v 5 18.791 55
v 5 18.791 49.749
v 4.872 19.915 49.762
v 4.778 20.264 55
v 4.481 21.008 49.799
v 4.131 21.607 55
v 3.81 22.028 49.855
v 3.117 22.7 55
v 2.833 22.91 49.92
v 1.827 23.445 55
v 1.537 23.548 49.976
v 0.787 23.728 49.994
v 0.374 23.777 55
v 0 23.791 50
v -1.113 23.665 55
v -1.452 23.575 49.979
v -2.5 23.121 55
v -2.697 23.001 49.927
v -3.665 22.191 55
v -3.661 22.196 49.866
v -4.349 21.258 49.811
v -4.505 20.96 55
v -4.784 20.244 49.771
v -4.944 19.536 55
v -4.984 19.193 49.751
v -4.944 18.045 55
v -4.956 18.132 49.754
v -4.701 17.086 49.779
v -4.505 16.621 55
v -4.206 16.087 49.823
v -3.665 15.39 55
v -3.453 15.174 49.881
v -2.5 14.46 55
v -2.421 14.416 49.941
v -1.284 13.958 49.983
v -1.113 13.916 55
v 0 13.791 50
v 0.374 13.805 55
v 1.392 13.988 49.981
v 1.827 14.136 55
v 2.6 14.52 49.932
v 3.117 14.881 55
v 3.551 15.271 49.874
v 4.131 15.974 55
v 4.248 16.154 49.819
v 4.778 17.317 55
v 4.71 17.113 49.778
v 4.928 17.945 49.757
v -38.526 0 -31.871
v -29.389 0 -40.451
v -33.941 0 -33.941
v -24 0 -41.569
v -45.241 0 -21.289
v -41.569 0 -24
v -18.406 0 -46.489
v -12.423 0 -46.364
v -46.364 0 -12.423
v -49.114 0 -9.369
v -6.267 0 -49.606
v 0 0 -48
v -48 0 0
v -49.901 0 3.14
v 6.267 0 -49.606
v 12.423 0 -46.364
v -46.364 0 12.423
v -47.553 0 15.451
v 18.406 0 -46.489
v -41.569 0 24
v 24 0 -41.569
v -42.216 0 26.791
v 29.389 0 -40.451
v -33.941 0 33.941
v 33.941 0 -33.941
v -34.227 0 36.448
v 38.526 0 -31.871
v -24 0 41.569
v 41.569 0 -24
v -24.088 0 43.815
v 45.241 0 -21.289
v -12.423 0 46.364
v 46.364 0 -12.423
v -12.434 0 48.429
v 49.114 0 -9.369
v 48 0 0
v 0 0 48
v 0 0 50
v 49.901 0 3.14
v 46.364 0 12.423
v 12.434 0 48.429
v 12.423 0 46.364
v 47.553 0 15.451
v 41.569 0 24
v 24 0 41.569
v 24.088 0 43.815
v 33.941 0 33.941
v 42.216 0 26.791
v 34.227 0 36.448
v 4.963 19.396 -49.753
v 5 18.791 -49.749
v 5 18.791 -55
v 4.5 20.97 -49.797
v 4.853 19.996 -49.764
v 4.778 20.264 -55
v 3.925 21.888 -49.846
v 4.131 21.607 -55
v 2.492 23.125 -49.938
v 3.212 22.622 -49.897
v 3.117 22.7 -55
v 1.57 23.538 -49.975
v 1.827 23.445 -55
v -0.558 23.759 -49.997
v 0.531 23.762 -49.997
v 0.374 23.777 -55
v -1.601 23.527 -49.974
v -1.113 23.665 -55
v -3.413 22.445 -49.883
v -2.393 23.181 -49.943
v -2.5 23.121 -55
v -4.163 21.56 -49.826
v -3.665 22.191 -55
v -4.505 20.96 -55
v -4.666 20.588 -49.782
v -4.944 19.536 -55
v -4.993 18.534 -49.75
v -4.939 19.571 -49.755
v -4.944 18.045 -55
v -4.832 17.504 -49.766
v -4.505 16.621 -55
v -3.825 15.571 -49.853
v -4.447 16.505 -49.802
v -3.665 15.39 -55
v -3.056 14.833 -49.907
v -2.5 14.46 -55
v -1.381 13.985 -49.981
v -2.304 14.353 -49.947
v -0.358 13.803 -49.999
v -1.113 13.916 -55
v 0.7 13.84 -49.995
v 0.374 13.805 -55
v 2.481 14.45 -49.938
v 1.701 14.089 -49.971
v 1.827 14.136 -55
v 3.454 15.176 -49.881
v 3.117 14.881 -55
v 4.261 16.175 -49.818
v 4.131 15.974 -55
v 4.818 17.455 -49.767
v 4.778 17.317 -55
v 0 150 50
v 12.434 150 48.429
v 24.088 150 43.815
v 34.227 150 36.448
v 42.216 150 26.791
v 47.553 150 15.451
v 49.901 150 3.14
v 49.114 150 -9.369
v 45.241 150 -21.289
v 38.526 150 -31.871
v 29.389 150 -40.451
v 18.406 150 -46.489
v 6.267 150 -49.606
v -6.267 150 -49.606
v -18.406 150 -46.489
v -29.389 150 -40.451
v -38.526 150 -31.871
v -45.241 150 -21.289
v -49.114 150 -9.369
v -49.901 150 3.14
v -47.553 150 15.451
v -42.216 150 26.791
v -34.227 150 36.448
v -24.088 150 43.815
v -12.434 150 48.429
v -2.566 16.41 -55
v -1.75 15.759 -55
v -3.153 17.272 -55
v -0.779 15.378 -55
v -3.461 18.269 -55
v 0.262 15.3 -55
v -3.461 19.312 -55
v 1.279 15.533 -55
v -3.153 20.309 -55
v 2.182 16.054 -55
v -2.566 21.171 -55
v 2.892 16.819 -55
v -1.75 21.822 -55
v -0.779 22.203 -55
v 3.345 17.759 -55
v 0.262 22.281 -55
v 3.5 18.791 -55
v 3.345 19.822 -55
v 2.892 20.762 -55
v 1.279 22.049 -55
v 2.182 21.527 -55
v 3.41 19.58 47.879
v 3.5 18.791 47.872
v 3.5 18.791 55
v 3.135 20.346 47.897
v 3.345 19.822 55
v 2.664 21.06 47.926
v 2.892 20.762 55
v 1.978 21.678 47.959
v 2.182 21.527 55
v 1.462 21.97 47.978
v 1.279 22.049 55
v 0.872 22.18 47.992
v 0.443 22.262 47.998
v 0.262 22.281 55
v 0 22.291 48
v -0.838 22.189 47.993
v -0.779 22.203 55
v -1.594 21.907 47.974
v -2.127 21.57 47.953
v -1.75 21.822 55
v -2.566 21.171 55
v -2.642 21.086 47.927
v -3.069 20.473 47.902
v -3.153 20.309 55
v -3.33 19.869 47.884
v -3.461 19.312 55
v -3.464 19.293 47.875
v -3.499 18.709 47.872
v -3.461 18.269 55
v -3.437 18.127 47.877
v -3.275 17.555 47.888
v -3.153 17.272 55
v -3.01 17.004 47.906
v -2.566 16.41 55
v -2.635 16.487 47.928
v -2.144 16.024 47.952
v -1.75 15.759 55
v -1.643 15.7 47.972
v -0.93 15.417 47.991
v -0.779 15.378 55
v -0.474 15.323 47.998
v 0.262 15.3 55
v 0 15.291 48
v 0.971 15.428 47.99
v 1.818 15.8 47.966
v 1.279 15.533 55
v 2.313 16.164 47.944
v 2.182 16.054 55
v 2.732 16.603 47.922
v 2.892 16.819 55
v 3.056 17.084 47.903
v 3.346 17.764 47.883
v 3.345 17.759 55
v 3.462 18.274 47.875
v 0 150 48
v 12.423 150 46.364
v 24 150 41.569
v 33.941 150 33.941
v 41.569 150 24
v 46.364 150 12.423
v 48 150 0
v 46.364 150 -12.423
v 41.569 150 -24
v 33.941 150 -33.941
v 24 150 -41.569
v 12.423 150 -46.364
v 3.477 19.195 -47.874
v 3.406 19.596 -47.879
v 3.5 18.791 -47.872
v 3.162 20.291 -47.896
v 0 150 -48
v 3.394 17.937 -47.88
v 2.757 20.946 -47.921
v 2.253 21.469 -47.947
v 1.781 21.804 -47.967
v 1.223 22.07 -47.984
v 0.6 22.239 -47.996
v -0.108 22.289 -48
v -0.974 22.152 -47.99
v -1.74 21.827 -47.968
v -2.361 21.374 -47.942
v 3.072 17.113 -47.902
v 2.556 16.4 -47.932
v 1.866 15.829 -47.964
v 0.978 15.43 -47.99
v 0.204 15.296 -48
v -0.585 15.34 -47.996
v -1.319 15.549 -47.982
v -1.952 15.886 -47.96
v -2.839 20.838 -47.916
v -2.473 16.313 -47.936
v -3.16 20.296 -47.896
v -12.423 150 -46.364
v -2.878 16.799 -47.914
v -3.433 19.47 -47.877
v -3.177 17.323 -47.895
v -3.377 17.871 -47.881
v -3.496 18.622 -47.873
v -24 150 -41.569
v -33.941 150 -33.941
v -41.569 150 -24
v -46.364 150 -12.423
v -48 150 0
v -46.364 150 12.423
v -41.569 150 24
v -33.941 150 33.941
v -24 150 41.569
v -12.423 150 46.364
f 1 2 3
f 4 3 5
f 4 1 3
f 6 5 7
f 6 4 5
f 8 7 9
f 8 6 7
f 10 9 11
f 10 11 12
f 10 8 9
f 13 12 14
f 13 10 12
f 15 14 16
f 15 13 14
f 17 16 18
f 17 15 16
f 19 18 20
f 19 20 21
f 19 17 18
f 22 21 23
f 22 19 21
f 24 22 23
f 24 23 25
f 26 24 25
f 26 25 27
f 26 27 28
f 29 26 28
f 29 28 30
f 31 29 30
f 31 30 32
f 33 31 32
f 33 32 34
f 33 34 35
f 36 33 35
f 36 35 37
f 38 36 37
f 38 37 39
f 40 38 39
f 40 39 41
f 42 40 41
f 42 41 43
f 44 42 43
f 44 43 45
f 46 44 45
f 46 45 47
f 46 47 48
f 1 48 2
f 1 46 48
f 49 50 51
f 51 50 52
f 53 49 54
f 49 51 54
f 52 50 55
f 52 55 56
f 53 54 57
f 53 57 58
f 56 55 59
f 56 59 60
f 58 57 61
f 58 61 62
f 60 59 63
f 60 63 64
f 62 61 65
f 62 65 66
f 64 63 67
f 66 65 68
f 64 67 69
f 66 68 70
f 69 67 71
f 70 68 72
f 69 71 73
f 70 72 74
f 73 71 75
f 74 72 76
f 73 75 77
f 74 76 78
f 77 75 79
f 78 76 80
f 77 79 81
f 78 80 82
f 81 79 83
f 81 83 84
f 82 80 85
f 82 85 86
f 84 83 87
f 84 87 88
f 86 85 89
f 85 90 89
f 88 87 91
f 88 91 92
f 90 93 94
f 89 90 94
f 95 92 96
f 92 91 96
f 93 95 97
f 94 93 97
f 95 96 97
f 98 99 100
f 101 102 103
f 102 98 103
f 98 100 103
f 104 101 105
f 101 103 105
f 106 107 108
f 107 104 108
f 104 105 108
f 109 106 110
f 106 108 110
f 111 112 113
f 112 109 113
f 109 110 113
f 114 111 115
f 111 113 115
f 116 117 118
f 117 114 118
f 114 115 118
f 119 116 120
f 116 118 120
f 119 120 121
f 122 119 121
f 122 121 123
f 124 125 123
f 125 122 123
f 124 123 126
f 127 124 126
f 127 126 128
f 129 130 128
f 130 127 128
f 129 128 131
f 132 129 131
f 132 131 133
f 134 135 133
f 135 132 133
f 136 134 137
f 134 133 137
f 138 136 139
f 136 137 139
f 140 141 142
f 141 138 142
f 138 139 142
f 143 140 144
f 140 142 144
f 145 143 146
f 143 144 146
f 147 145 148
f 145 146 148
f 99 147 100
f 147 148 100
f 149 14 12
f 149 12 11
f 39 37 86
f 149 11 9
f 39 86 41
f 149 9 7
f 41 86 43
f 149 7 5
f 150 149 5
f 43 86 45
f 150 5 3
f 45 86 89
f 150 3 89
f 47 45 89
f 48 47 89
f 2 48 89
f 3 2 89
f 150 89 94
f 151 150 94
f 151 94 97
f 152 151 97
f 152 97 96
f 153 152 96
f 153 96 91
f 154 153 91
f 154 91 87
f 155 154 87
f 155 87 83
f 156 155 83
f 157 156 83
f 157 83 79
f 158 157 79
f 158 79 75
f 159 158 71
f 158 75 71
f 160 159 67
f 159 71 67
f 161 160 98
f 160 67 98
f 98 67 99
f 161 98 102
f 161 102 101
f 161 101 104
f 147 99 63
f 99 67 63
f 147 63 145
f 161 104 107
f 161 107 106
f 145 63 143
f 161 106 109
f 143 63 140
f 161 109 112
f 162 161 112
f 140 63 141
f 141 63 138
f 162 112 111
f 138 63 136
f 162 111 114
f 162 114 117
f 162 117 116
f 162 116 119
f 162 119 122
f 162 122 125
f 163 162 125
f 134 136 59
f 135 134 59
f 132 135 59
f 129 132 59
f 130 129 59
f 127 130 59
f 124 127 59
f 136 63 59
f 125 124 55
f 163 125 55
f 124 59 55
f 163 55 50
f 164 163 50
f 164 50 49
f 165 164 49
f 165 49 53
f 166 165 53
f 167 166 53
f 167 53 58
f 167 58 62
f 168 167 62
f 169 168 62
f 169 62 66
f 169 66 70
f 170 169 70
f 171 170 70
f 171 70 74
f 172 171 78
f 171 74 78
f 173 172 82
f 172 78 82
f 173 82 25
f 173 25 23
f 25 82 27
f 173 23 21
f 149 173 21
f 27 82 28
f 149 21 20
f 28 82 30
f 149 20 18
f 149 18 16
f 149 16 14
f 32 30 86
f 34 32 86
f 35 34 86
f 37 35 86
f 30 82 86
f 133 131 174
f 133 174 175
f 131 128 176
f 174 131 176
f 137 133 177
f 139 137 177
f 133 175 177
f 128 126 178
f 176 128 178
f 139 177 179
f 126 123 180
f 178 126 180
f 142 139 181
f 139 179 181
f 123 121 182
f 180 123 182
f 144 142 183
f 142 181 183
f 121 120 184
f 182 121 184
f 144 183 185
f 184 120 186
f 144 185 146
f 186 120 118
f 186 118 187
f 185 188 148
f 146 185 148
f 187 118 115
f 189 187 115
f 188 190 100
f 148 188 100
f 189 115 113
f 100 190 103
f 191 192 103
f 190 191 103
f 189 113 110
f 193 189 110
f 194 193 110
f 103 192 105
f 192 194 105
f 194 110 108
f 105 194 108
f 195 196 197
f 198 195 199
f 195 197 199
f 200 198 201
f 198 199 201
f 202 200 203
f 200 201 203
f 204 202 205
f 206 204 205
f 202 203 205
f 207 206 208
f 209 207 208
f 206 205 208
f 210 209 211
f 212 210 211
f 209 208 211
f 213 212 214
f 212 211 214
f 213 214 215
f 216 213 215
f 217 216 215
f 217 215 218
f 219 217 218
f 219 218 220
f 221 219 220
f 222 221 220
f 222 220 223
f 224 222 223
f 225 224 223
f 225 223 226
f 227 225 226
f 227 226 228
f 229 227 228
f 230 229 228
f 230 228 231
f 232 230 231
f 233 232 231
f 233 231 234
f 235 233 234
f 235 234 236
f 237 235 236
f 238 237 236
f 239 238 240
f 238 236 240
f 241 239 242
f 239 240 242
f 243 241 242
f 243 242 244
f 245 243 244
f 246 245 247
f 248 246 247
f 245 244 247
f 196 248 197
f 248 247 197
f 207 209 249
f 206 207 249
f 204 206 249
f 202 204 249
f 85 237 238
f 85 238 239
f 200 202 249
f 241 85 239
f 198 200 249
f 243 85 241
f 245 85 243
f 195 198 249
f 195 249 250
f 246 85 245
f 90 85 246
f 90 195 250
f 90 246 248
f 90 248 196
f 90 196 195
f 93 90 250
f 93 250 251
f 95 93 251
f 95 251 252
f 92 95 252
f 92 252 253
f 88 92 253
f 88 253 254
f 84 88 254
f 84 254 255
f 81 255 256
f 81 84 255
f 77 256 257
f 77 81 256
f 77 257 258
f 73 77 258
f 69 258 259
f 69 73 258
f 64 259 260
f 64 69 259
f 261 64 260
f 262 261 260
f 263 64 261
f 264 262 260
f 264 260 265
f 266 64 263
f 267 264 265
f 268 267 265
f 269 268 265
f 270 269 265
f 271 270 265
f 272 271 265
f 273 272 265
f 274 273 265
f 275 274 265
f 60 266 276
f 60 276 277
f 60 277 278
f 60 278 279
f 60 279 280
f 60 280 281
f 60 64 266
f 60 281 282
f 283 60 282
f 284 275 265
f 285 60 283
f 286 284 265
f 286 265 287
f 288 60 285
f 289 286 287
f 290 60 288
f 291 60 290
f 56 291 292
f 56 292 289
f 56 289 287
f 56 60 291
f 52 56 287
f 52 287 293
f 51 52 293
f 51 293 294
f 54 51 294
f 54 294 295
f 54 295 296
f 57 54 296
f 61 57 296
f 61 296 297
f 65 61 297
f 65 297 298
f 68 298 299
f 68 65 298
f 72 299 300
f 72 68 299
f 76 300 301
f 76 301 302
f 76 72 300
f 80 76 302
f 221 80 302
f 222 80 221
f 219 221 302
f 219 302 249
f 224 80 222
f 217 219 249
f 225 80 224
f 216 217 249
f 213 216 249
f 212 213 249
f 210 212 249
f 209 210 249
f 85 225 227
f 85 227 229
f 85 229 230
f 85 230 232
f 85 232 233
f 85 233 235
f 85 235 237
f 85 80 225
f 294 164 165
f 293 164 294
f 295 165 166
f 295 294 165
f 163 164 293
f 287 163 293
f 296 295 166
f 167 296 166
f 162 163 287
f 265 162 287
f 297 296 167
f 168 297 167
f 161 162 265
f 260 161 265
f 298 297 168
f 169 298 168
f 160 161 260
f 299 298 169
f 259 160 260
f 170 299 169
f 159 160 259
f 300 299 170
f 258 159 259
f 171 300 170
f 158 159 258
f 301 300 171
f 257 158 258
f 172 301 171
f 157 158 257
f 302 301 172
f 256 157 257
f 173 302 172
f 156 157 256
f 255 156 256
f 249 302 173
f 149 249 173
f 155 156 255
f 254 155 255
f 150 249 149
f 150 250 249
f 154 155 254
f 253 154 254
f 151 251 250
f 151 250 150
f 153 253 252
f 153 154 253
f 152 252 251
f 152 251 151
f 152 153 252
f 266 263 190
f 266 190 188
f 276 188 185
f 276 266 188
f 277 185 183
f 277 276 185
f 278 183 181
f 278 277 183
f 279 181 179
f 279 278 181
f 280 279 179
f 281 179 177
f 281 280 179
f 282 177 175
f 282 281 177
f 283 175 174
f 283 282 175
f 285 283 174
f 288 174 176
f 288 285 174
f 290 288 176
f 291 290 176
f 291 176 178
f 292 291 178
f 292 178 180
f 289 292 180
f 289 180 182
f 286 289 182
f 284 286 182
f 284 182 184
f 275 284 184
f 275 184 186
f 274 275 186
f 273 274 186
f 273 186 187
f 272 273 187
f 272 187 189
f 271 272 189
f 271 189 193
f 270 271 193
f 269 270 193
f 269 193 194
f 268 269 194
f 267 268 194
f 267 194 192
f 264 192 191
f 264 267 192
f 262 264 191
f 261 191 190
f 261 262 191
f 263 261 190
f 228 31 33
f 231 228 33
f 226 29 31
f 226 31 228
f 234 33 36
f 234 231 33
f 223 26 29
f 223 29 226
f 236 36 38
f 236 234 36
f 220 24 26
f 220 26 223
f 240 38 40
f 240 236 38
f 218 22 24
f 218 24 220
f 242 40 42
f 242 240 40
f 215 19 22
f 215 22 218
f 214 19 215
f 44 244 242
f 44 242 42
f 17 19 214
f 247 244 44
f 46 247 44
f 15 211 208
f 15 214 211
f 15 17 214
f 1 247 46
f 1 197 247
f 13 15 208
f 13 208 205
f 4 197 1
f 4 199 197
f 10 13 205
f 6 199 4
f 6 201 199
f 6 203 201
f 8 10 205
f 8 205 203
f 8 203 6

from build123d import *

# Parameters (mm, degrees)
SKETCH1_R                = 50
SKETCH1_R_2              = 48
BOSS_EXTRUDE2_DEPTH      = 150
BOSS_EXTRUDE3_REACH      = 191.803
BOSS_EXTRUDE3_END_RADIUS = 50
SKETCH2_R                = 5
SKETCH3_R                = 3.5
CUT_EXTRUDE1_DEPTH       = 12
BOSS_EXTRUDE4_REACH      = 194.614
BOSS_EXTRUDE4_END_RADIUS = 50
SKETCH4_R                = 5
CUT_EXTRUDE2_START       = -12
SKETCH5_R                = 3.5
CUT_EXTRUDE2_DEPTH       = 12


with BuildPart() as part:
    # Sketch1 → Boss-Extrude2 (new body)
    with BuildSketch(Plane(origin=(0, 0, 0), x_dir=(1, 0, 0), z_dir=(0, 1, 0))):
        with Locations(Location((0, 0, 0), (0, 0, 270))):
            Circle(SKETCH1_R)
        with Locations(Location((0, 0, 0), (0, 0, 270))):
            Circle(SKETCH1_R_2, mode=Mode.SUBTRACT)
    extrude(amount=BOSS_EXTRUDE2_DEPTH)

    # Boss-Extrude3: up to this cylinder (the profile starts outside it)
    boss_extrude3_end = Plane(origin=(0, 18.790559, 0), z_dir=(0, -1, 0)) * Cylinder(BOSS_EXTRUDE3_END_RADIUS, 484.606, mode=Mode.PRIVATE)
    # Sketch2 → Boss-Extrude3 (add, up to the surface)
    with BuildSketch(Plane.XY.offset(55), mode=Mode.PRIVATE) as boss_extrude3_sk1:
        with Locations((0, 18.790558937)):
            Circle(SKETCH2_R)
    boss_extrude3_tool1 = extrude(boss_extrude3_sk1.sketch, amount=-BOSS_EXTRUDE3_REACH, mode=Mode.PRIVATE) - boss_extrude3_end
    add(boss_extrude3_tool1.solids().sort_by_distance((0, 18.790559, 55))[0])

    # Sketch3 → Cut-Extrude1 (cut)
    with BuildSketch(Plane.XY.offset(55)):
        with Locations((0, 18.790558937)):
            Circle(SKETCH3_R)
    extrude(amount=-CUT_EXTRUDE1_DEPTH, mode=Mode.SUBTRACT)

    # Boss-Extrude4: up to this cylinder (the profile starts outside it)
    boss_extrude4_end = Plane(origin=(0, 18.790559, 0), z_dir=(0, -1, 0)) * Cylinder(BOSS_EXTRUDE4_END_RADIUS, 490.228, mode=Mode.PRIVATE)
    # Sketch4 → Boss-Extrude4 (add, up to the surface)
    with BuildSketch(Plane.XY.offset(-55), mode=Mode.PRIVATE) as boss_extrude4_sk1:
        with Locations((0, 18.790558937)):
            Circle(SKETCH4_R)
    boss_extrude4_tool1 = extrude(boss_extrude4_sk1.sketch, amount=BOSS_EXTRUDE4_REACH, mode=Mode.PRIVATE) - boss_extrude4_end
    add(boss_extrude4_tool1.solids().sort_by_distance((0, 18.790559, -55))[0])

    # Sketch5 → Cut-Extrude2 (cut)
    with BuildSketch(Plane(origin=(0, 0, -55), x_dir=(-1, 0, 0), z_dir=(0, 0, -1)).offset(CUT_EXTRUDE2_START)):
        with Locations(Location((0, 18.790558937, 0), (0, 0, 180))):
            Circle(SKETCH5_R)
    extrude(amount=CUT_EXTRUDE2_DEPTH, mode=Mode.SUBTRACT)


solid = part.part
